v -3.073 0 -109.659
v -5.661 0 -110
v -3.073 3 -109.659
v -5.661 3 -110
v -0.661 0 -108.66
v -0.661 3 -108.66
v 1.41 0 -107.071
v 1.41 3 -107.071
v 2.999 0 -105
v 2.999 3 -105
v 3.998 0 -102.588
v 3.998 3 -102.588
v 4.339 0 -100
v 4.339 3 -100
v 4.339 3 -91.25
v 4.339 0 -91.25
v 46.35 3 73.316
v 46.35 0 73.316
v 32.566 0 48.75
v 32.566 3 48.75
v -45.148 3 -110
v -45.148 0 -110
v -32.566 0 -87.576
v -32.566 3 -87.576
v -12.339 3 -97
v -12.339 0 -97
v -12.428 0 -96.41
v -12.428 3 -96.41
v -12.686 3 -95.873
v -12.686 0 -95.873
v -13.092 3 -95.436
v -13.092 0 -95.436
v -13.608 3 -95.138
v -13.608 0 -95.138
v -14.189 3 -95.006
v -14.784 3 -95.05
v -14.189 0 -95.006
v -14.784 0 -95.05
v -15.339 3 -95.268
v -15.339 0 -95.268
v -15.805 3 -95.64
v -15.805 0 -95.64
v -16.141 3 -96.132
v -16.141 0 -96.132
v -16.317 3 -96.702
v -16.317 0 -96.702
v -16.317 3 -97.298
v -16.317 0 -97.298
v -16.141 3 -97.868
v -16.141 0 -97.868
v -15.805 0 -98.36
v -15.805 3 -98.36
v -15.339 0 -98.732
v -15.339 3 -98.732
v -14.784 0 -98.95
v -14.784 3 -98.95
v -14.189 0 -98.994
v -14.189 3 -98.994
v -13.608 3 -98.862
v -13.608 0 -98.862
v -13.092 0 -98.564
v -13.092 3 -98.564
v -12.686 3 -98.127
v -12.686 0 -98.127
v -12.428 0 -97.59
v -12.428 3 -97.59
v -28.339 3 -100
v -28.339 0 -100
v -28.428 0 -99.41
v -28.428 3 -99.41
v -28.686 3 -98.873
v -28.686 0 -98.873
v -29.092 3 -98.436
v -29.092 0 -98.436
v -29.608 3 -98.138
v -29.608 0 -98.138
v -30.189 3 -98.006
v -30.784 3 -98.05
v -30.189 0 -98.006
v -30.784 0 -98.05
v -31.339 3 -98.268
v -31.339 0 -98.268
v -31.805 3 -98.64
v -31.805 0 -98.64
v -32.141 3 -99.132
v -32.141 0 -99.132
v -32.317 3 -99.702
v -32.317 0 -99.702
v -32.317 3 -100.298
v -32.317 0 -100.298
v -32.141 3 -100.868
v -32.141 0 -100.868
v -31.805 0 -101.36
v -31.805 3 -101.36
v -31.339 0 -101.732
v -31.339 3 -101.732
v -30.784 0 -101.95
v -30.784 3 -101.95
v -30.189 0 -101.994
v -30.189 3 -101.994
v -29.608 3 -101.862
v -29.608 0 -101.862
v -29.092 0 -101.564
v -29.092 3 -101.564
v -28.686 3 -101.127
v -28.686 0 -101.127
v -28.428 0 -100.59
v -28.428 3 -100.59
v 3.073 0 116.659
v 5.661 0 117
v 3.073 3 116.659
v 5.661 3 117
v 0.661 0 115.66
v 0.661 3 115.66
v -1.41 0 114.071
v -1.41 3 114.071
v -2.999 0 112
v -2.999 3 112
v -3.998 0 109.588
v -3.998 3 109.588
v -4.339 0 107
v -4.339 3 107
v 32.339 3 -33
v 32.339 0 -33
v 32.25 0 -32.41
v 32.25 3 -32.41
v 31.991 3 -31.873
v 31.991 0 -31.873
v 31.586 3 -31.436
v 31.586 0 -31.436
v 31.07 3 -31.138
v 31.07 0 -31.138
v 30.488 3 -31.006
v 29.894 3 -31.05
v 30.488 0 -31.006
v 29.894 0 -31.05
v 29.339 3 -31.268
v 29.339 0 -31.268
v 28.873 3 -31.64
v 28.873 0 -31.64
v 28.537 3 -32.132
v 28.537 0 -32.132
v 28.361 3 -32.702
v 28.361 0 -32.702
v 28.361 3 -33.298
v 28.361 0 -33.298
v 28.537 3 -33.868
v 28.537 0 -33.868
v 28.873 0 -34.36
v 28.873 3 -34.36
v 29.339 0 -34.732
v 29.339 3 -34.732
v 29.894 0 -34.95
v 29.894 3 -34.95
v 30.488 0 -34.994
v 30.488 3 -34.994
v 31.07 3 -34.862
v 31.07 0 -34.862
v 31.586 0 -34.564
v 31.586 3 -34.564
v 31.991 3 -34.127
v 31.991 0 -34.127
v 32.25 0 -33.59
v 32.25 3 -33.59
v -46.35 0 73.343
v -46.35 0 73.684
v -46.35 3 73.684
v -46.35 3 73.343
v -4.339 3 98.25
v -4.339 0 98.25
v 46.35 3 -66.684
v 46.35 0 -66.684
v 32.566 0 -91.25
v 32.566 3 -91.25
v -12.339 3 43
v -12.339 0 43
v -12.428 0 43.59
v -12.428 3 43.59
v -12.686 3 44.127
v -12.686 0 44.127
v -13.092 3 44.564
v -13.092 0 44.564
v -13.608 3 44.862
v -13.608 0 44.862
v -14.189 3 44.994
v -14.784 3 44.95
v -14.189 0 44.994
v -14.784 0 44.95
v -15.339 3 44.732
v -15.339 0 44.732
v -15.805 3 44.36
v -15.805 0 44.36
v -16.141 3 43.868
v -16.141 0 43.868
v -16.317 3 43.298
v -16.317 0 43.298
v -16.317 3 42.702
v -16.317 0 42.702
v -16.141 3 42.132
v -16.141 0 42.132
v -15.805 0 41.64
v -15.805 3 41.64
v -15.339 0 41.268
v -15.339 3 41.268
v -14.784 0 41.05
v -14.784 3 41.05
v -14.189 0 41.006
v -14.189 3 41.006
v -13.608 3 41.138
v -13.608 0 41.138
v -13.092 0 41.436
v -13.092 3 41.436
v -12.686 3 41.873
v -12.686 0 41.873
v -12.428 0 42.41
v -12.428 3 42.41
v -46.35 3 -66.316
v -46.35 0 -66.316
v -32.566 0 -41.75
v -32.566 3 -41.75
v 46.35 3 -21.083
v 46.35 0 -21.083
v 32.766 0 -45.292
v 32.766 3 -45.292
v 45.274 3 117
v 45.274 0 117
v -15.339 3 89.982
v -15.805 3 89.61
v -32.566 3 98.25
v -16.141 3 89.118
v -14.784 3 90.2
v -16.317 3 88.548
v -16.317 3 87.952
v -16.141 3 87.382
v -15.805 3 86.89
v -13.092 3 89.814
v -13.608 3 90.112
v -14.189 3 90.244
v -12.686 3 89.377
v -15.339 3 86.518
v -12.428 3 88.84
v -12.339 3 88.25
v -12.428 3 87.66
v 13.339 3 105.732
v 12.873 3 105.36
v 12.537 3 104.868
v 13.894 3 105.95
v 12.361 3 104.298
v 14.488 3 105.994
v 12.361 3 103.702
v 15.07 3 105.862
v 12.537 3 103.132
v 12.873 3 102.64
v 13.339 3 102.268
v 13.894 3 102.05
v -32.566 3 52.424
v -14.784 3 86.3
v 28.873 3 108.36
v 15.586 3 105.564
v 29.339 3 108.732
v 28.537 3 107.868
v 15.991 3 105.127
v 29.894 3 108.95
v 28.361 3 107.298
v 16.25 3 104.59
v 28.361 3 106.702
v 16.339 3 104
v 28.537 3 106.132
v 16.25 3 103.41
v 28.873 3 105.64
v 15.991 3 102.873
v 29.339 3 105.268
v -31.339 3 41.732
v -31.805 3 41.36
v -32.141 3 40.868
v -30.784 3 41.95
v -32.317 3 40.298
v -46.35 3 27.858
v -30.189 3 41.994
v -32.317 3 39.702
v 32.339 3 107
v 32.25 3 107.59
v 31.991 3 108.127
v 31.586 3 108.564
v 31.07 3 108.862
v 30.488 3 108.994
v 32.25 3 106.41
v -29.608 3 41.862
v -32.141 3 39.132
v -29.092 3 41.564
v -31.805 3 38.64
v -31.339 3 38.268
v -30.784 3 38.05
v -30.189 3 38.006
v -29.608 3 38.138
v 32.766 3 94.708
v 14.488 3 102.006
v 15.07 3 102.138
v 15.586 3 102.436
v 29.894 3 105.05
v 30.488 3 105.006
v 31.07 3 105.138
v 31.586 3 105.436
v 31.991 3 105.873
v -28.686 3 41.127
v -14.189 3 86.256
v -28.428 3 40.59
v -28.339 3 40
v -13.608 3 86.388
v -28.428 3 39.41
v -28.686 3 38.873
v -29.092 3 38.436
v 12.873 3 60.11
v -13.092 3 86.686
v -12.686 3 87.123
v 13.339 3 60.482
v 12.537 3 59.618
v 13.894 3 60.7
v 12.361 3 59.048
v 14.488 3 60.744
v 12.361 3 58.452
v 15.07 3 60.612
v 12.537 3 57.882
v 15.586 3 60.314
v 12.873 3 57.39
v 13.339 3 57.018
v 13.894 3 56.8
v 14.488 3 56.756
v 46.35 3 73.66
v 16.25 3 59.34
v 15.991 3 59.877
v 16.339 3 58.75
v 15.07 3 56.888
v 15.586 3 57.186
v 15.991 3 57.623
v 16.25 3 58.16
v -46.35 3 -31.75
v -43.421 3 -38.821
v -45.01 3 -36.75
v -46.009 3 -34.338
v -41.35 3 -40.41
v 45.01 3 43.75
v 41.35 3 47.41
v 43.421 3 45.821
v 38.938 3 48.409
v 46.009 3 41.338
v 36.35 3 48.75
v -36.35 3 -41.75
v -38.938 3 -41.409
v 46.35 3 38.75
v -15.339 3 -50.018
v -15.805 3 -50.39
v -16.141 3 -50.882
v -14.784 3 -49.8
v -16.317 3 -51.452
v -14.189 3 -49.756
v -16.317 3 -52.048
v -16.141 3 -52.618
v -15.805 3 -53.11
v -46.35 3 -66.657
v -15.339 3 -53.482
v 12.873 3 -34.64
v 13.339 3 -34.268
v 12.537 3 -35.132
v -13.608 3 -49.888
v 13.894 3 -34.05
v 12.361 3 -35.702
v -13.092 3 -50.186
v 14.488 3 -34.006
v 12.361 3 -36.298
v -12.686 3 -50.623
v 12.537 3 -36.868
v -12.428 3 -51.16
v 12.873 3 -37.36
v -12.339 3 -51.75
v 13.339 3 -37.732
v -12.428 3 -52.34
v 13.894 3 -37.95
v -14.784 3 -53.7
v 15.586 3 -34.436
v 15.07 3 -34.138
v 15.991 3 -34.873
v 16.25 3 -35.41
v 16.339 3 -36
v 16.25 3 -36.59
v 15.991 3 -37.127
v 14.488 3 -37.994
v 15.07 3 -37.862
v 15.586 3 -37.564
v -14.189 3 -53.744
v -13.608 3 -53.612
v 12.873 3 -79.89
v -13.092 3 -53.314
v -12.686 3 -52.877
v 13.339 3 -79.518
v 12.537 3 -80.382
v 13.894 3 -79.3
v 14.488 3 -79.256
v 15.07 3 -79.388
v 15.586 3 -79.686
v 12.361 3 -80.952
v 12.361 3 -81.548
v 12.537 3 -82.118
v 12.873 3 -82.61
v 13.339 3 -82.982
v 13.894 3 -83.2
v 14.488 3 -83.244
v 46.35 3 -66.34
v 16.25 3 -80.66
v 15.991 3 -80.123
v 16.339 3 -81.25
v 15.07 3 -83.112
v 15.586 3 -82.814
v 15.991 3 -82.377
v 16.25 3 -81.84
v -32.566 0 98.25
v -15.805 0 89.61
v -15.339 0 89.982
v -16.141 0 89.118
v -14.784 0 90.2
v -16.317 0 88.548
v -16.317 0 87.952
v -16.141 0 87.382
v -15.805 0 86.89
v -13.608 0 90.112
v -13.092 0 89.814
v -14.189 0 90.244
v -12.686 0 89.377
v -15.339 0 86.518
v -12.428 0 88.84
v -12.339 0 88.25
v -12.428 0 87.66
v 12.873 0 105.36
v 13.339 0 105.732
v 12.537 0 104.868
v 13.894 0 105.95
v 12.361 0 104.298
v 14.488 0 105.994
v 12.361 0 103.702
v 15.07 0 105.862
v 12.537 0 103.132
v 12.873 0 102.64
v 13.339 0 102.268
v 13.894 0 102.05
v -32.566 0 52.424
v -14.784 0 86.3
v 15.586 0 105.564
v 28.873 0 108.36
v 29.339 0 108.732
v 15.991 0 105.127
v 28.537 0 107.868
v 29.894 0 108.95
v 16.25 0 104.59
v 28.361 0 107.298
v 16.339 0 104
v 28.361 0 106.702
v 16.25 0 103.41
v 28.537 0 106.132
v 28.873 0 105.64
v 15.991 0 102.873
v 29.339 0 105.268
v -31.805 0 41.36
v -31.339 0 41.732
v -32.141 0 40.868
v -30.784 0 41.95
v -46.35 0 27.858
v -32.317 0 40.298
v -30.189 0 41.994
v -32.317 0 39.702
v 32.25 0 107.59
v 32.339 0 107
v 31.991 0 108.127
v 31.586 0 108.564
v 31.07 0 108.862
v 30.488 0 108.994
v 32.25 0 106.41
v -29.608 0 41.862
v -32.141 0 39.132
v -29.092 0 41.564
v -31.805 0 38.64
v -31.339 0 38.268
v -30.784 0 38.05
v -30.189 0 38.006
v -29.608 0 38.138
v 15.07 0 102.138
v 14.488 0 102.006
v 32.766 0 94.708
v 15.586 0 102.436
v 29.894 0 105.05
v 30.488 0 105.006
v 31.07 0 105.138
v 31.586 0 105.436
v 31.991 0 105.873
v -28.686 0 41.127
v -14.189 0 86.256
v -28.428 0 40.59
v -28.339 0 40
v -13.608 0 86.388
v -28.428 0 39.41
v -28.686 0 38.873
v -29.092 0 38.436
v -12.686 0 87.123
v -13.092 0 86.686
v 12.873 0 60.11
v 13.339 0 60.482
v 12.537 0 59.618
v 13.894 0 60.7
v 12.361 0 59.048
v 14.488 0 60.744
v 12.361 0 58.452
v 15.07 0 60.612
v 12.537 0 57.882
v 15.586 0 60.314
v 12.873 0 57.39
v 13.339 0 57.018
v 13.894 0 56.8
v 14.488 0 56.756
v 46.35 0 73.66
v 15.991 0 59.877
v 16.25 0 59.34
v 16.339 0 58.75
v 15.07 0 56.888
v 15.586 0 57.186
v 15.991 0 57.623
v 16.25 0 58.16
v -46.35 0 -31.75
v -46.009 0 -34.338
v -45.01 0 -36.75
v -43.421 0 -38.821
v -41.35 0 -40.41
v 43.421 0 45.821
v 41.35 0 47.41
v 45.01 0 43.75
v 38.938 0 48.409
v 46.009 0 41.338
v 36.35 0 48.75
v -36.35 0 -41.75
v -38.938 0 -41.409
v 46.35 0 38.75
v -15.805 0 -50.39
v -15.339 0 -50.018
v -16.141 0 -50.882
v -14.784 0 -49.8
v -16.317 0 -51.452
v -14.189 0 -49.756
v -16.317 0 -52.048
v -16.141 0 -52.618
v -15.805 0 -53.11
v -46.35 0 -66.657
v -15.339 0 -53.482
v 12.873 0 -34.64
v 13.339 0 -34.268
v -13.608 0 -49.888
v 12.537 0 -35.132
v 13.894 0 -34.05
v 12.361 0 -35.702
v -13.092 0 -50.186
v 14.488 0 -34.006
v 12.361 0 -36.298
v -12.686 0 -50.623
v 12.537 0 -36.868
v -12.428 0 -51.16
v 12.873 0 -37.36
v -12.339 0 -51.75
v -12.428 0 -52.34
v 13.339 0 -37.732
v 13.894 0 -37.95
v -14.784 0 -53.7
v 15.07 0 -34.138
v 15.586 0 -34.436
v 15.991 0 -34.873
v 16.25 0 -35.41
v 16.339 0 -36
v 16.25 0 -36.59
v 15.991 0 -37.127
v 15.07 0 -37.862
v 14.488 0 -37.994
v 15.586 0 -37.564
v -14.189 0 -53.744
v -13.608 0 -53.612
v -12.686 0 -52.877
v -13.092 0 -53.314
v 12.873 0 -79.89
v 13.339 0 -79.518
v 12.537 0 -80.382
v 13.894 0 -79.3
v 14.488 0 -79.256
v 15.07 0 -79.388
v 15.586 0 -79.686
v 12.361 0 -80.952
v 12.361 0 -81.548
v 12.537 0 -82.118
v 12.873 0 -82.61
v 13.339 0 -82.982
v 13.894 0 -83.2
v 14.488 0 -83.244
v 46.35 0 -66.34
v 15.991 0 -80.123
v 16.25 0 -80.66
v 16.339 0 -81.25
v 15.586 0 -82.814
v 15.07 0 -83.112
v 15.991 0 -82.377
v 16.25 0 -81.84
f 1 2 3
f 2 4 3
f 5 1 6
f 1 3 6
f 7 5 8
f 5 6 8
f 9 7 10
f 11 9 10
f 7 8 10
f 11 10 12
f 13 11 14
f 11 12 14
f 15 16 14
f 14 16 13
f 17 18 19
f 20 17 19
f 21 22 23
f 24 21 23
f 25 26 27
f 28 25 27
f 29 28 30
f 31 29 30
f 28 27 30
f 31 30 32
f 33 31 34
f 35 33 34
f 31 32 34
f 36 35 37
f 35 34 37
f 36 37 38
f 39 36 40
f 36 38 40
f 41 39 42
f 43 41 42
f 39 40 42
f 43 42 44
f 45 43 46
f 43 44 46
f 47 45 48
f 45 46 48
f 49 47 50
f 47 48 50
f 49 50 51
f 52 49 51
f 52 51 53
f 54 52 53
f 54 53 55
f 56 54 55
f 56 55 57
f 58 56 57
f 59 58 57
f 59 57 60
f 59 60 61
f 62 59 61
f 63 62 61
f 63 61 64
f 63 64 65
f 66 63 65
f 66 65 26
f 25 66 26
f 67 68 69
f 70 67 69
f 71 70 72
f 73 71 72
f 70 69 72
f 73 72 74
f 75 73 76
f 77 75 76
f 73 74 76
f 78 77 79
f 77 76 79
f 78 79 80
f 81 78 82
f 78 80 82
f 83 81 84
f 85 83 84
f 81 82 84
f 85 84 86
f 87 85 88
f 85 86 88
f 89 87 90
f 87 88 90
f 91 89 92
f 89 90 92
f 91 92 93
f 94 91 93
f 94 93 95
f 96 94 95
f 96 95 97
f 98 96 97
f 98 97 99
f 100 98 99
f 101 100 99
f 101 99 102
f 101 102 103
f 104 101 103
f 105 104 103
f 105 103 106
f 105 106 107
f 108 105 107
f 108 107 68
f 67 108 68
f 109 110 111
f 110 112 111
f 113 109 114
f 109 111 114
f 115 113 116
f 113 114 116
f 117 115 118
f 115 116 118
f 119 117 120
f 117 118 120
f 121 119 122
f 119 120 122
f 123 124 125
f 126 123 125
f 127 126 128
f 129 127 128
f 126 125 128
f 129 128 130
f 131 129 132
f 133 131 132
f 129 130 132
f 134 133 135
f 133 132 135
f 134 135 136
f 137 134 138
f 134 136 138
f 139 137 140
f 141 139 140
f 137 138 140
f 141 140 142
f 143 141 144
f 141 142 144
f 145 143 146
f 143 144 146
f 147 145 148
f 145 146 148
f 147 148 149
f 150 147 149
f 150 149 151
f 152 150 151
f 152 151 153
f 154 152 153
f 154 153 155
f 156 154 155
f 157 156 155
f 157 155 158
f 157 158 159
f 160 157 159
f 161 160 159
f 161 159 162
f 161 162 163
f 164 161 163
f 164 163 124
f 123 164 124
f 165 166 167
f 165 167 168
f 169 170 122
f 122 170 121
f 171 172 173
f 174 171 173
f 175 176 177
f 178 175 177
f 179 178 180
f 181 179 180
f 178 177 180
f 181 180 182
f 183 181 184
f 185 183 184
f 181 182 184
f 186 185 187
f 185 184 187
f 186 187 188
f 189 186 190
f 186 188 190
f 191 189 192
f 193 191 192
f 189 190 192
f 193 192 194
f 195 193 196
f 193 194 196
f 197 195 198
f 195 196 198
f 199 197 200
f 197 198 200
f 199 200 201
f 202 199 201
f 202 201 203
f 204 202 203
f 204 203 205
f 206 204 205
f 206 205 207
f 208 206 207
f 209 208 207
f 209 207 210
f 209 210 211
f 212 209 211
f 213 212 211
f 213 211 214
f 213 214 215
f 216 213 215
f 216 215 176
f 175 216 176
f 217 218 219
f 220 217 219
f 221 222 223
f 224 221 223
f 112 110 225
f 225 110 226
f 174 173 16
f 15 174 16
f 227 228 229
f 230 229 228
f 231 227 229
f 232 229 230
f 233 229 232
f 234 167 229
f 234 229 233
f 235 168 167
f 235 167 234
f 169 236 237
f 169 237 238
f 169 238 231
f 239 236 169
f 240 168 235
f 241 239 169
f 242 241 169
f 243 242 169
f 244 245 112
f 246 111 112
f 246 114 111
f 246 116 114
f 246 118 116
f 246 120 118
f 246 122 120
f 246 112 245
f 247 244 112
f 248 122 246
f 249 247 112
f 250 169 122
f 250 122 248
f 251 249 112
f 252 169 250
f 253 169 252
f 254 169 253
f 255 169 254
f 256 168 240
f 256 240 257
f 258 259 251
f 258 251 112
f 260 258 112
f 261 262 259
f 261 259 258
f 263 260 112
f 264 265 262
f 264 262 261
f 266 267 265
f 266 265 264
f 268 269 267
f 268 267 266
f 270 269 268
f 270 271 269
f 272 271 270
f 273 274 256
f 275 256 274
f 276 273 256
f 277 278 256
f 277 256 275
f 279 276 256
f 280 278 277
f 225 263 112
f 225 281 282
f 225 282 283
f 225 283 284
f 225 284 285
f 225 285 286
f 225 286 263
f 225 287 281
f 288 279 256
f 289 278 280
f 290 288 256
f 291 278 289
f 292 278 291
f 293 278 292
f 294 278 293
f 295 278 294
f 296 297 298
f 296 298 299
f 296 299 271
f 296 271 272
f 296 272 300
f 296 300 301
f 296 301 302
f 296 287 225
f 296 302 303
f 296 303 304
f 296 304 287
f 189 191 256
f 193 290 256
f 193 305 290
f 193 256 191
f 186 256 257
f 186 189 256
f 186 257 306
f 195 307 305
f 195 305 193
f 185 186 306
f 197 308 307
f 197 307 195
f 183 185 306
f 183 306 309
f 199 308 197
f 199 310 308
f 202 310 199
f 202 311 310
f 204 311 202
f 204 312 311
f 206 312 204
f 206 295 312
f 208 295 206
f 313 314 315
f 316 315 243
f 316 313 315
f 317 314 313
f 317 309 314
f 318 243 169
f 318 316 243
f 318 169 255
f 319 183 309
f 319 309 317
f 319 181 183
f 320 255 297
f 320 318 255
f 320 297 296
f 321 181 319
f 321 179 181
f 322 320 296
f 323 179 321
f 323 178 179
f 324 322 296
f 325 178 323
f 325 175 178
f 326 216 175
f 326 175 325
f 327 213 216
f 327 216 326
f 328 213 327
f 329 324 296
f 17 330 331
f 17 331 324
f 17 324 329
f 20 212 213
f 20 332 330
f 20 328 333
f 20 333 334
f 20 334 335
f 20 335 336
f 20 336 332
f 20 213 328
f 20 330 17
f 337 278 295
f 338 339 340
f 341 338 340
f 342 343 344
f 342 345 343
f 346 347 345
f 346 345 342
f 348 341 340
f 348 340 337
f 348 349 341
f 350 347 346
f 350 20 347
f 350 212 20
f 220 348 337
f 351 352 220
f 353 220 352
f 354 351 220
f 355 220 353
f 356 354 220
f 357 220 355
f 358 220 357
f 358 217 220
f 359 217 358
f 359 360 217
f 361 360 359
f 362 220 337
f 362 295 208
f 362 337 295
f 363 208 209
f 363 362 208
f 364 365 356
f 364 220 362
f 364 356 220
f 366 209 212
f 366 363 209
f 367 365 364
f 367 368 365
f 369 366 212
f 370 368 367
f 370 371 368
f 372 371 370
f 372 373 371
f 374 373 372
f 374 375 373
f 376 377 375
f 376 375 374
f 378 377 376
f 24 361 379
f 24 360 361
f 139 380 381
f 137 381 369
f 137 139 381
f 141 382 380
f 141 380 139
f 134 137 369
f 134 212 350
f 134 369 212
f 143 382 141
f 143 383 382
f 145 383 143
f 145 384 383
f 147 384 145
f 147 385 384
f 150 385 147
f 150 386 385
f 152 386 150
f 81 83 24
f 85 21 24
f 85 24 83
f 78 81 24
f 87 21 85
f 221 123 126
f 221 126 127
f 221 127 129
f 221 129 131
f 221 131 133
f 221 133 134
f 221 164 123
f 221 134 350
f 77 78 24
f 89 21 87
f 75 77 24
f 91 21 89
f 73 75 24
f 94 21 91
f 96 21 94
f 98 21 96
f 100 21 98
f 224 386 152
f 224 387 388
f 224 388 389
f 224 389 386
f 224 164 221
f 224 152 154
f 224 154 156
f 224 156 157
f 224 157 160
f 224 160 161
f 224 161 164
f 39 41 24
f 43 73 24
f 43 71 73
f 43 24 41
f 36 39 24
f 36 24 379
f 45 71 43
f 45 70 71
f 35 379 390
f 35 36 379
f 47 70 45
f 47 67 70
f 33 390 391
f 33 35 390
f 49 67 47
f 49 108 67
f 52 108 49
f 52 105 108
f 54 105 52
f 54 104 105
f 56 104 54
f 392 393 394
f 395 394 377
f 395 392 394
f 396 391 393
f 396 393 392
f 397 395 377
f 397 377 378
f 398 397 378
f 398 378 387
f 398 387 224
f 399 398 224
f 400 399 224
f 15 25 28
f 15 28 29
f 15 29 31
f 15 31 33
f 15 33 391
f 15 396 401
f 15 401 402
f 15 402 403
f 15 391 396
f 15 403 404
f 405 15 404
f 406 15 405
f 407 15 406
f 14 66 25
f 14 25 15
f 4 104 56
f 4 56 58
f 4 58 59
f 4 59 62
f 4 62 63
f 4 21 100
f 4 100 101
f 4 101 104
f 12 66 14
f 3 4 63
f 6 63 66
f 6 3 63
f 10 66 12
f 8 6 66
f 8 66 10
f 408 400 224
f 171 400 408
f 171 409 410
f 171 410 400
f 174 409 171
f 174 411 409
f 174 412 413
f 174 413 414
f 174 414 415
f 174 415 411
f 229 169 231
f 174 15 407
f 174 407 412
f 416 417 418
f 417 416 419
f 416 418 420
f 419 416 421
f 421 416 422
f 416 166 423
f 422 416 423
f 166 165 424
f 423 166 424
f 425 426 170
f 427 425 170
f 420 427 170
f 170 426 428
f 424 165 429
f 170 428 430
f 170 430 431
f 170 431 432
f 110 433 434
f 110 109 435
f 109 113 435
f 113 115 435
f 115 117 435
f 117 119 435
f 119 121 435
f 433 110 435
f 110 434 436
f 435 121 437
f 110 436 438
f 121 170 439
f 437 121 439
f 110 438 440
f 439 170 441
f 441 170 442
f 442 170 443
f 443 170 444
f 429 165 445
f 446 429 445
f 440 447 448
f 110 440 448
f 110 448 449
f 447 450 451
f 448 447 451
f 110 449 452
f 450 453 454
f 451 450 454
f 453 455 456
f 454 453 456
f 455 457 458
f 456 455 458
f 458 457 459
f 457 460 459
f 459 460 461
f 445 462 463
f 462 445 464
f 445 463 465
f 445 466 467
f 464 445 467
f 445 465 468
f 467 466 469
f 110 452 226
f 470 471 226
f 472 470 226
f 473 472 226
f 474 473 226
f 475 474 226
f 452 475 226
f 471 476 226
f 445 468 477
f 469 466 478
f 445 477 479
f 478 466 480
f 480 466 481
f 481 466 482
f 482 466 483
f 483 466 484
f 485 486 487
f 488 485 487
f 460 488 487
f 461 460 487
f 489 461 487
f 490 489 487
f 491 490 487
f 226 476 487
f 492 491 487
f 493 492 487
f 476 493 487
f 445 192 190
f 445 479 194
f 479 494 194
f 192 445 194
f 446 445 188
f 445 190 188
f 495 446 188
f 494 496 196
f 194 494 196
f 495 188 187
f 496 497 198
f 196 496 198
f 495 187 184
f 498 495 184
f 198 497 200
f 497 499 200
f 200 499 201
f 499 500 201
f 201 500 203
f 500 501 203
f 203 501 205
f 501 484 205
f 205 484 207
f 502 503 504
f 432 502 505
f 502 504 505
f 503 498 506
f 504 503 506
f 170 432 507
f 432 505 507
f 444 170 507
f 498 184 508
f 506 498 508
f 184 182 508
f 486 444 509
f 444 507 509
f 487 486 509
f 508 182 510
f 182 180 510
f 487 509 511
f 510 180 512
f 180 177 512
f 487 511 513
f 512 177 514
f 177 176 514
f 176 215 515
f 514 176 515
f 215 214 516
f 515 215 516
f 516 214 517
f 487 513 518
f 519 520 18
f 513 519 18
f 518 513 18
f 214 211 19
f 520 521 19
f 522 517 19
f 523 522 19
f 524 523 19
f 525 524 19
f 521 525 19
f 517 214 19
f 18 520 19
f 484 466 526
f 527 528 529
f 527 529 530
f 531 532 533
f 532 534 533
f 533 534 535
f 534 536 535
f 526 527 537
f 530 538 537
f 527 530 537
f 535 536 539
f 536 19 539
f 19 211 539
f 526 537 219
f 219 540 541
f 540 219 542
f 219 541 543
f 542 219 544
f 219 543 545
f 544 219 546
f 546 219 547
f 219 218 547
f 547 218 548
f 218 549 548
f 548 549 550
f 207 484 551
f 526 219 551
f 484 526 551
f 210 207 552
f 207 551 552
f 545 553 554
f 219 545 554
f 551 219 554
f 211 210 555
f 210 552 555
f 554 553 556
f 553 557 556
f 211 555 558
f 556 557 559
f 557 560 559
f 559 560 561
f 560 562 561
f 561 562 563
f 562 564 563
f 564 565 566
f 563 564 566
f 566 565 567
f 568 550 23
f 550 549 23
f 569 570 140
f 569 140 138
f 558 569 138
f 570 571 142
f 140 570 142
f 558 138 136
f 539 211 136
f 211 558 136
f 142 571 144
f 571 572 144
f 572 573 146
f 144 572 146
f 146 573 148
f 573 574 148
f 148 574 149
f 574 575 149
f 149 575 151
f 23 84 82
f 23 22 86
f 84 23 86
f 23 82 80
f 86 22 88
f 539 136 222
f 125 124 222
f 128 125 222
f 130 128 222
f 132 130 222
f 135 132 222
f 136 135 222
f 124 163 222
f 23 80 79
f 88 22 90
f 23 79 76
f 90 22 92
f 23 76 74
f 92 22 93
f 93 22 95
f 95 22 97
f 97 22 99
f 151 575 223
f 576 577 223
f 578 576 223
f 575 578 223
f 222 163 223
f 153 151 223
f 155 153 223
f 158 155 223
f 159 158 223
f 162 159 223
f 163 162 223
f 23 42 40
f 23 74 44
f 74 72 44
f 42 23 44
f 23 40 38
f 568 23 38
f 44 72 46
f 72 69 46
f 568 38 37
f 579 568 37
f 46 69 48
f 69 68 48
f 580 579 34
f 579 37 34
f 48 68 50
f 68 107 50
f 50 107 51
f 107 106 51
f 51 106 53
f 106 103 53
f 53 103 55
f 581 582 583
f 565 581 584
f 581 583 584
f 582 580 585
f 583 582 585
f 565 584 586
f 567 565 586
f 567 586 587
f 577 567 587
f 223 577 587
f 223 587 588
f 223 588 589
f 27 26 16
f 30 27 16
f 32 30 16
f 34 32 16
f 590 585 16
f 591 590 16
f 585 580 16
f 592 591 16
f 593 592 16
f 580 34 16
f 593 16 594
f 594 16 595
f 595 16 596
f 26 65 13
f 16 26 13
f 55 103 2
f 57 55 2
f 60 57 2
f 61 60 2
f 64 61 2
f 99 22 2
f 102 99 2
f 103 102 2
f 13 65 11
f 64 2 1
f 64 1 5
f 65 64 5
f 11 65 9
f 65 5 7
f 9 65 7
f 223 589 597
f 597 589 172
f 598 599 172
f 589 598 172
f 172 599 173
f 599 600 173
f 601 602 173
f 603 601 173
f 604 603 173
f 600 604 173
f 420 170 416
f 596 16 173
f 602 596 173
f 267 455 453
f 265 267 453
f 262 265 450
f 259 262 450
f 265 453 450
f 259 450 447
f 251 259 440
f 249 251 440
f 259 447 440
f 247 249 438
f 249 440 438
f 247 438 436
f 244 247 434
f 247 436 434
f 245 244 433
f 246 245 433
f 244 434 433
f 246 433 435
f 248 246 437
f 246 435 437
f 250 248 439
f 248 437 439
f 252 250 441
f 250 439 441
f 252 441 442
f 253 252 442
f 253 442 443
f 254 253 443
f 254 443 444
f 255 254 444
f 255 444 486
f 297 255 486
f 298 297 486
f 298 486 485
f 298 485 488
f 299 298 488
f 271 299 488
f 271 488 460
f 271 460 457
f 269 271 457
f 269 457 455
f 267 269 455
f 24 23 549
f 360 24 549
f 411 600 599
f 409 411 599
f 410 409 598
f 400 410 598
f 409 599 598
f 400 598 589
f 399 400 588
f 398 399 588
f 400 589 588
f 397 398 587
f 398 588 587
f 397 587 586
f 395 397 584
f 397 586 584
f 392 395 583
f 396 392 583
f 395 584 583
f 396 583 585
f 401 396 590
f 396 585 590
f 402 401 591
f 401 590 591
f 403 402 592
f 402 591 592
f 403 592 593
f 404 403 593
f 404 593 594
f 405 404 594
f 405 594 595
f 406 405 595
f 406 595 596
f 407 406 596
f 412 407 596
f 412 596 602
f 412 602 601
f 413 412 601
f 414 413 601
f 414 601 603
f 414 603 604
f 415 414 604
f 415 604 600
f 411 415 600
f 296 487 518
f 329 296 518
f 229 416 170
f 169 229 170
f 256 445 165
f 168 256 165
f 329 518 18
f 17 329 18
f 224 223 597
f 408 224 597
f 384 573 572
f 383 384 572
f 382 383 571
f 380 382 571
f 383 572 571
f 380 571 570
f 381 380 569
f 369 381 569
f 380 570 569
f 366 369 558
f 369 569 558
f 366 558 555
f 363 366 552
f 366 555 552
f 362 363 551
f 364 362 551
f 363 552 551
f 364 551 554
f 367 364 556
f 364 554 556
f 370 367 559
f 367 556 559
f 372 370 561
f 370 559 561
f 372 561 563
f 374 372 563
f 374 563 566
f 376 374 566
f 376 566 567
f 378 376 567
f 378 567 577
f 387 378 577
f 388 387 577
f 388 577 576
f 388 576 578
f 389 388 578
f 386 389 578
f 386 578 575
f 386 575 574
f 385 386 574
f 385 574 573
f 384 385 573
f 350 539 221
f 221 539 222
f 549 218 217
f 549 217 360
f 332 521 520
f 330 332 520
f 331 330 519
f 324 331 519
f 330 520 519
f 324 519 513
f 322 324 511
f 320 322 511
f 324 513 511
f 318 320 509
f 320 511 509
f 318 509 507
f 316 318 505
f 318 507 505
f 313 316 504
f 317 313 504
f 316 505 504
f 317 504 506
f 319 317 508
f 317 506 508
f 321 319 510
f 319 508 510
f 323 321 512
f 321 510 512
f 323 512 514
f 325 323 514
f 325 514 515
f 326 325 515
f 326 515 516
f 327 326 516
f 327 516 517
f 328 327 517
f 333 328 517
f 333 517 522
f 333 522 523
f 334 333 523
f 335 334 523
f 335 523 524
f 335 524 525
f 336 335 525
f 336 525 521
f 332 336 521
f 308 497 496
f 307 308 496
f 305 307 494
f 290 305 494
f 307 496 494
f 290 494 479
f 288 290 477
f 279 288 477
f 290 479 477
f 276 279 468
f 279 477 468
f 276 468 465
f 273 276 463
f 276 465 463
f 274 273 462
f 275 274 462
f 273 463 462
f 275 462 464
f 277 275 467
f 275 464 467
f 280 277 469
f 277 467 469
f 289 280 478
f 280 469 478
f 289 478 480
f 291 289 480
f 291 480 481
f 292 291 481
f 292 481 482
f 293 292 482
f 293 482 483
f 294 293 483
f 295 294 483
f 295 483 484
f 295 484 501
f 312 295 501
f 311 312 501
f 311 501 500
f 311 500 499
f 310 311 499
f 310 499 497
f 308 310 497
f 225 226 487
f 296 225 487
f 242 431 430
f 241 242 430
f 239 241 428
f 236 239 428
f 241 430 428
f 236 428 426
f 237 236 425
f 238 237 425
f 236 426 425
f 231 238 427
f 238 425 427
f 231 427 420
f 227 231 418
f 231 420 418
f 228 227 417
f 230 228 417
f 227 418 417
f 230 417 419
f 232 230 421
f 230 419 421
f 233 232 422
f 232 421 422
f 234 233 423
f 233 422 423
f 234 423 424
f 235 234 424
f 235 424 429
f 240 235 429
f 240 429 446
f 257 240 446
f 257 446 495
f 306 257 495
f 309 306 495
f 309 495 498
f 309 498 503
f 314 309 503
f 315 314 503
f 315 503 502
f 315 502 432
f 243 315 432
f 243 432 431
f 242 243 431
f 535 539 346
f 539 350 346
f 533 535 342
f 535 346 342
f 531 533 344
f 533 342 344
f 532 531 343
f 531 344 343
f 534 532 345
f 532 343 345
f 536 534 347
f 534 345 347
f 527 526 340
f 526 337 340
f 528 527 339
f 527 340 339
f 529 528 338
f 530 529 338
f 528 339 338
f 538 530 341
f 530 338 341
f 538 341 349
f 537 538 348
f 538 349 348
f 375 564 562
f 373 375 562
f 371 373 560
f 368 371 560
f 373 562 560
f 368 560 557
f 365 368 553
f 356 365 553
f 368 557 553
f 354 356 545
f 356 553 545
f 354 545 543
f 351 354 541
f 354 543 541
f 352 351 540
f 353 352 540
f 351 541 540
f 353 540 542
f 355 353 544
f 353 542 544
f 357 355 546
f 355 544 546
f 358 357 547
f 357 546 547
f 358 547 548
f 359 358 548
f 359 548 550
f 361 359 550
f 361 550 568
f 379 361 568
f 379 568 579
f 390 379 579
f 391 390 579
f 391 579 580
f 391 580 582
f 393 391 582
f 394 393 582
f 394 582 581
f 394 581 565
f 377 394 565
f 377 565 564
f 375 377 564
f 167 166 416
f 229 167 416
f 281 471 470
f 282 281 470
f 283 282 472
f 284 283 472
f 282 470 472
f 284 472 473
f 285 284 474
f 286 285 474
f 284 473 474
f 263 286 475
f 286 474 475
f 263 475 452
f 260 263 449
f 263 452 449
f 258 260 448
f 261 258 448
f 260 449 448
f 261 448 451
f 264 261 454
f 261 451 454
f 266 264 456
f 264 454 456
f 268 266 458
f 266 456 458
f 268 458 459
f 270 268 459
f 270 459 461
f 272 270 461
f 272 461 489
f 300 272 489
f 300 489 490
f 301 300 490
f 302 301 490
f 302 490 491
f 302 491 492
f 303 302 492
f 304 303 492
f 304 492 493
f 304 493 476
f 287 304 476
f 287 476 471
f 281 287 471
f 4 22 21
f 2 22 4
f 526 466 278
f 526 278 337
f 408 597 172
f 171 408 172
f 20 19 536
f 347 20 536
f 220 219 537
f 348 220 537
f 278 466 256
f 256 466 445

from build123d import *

# Parameters (mm, degrees)
SKETCH1_W           = 92.7
SKETCH1_H           = 227
BOSS_EXTRUDE1_DEPTH = 3
SKETCH3_R           = 2
CUT_EXTRUDE1_DEPTH  = 4
FILLET1_R           = 10


with BuildPart() as part:
    # Sketch1 → Boss-Extrude1 (new body)
    with BuildSketch(Plane(origin=(0, 0, 0), x_dir=(1, 0, 0), z_dir=(0, 1, 0))):
        with Locations((0, -3.5)):
            Rectangle(SKETCH1_W, SKETCH1_H)
    extrude(amount=BOSS_EXTRUDE1_DEPTH)

    # Sketch3 → Cut-Extrude1 (cut, through all)
    with BuildSketch(Plane.XZ):
        Polygon((-46.35, -110), (-45.148132032, -110), (-32.56577351, -87.57595075), (-46.35, -66.656688952), align=None)
        Polygon((-46.35, -41.75), (-46.35, -66.315996364), (-32.56577351, -41.75), align=None)
        with Locations((-30.338884711, -100)):
            Circle(SKETCH3_R)
        with Locations((-14.338884711, -97)):
            Circle(SKETCH3_R)
        Polygon((32.565746646, -91.25), (4.338884711, -91.25), (4.338884711, -110), (46.35, -110), (46.35, -66.68400328), align=None)
        Polygon((32.766055192, -45.29151818), (46.35, -66.340018534), (46.35, -21.082506998), align=None)
        with Locations((30.338884711, -33)):
            Circle(SKETCH3_R)
        with Locations((14.338884711, -36)):
            Circle(SKETCH3_R)
        with Locations((14.338884711, -81.25)):
            Circle(SKETCH3_R)
        Polygon((-46.35, 117), (-46.35, 73.684003636), (-32.56577351, 98.25), (-4.338884711, 98.25), (-4.338884711, 117), align=None)
        Polygon((-46.35, 73.343311048), (-46.35, 27.858052887), (-32.56577351, 52.42404925), align=None)
        Polygon((32.565746646, 48.75), (46.35, 48.75), (46.35, 73.31599672), align=None)
        Polygon((32.766055192, 94.70848182), (46.35, 73.659981466), (46.35, 117), (45.274073399, 117), align=None)
        with Locations((14.338884711, 58.75)):
            Circle(SKETCH3_R)
        with Locations((14.338884711, 104)):
            Circle(SKETCH3_R)
        with Locations((30.338884711, 107)):
            Circle(SKETCH3_R)
        with Locations((-14.338884711, 43)):
            Circle(SKETCH3_R)
        with Locations((-30.338884711, 40)):
            Circle(SKETCH3_R)
        with Locations((-14.338884711, 88.25)):
            Circle(SKETCH3_R)
        with Locations((-14.338884711, -51.75)):
            Circle(SKETCH3_R)
    extrude(amount=-CUT_EXTRUDE1_DEPTH, mode=Mode.SUBTRACT)

    # Fillet1
    fillet1_edges = [part.edges().sort_by_distance(p)[0] for p in [
        (46.35, 1.5, 48.75),
        (-4.338884711, 1.5, 117),
        (4.338884711, 1.5, -110),
        (-46.35, 1.5, -41.75),
    ]]
    fillet(fillet1_edges, radius=FILLET1_R)


solid = part.part
